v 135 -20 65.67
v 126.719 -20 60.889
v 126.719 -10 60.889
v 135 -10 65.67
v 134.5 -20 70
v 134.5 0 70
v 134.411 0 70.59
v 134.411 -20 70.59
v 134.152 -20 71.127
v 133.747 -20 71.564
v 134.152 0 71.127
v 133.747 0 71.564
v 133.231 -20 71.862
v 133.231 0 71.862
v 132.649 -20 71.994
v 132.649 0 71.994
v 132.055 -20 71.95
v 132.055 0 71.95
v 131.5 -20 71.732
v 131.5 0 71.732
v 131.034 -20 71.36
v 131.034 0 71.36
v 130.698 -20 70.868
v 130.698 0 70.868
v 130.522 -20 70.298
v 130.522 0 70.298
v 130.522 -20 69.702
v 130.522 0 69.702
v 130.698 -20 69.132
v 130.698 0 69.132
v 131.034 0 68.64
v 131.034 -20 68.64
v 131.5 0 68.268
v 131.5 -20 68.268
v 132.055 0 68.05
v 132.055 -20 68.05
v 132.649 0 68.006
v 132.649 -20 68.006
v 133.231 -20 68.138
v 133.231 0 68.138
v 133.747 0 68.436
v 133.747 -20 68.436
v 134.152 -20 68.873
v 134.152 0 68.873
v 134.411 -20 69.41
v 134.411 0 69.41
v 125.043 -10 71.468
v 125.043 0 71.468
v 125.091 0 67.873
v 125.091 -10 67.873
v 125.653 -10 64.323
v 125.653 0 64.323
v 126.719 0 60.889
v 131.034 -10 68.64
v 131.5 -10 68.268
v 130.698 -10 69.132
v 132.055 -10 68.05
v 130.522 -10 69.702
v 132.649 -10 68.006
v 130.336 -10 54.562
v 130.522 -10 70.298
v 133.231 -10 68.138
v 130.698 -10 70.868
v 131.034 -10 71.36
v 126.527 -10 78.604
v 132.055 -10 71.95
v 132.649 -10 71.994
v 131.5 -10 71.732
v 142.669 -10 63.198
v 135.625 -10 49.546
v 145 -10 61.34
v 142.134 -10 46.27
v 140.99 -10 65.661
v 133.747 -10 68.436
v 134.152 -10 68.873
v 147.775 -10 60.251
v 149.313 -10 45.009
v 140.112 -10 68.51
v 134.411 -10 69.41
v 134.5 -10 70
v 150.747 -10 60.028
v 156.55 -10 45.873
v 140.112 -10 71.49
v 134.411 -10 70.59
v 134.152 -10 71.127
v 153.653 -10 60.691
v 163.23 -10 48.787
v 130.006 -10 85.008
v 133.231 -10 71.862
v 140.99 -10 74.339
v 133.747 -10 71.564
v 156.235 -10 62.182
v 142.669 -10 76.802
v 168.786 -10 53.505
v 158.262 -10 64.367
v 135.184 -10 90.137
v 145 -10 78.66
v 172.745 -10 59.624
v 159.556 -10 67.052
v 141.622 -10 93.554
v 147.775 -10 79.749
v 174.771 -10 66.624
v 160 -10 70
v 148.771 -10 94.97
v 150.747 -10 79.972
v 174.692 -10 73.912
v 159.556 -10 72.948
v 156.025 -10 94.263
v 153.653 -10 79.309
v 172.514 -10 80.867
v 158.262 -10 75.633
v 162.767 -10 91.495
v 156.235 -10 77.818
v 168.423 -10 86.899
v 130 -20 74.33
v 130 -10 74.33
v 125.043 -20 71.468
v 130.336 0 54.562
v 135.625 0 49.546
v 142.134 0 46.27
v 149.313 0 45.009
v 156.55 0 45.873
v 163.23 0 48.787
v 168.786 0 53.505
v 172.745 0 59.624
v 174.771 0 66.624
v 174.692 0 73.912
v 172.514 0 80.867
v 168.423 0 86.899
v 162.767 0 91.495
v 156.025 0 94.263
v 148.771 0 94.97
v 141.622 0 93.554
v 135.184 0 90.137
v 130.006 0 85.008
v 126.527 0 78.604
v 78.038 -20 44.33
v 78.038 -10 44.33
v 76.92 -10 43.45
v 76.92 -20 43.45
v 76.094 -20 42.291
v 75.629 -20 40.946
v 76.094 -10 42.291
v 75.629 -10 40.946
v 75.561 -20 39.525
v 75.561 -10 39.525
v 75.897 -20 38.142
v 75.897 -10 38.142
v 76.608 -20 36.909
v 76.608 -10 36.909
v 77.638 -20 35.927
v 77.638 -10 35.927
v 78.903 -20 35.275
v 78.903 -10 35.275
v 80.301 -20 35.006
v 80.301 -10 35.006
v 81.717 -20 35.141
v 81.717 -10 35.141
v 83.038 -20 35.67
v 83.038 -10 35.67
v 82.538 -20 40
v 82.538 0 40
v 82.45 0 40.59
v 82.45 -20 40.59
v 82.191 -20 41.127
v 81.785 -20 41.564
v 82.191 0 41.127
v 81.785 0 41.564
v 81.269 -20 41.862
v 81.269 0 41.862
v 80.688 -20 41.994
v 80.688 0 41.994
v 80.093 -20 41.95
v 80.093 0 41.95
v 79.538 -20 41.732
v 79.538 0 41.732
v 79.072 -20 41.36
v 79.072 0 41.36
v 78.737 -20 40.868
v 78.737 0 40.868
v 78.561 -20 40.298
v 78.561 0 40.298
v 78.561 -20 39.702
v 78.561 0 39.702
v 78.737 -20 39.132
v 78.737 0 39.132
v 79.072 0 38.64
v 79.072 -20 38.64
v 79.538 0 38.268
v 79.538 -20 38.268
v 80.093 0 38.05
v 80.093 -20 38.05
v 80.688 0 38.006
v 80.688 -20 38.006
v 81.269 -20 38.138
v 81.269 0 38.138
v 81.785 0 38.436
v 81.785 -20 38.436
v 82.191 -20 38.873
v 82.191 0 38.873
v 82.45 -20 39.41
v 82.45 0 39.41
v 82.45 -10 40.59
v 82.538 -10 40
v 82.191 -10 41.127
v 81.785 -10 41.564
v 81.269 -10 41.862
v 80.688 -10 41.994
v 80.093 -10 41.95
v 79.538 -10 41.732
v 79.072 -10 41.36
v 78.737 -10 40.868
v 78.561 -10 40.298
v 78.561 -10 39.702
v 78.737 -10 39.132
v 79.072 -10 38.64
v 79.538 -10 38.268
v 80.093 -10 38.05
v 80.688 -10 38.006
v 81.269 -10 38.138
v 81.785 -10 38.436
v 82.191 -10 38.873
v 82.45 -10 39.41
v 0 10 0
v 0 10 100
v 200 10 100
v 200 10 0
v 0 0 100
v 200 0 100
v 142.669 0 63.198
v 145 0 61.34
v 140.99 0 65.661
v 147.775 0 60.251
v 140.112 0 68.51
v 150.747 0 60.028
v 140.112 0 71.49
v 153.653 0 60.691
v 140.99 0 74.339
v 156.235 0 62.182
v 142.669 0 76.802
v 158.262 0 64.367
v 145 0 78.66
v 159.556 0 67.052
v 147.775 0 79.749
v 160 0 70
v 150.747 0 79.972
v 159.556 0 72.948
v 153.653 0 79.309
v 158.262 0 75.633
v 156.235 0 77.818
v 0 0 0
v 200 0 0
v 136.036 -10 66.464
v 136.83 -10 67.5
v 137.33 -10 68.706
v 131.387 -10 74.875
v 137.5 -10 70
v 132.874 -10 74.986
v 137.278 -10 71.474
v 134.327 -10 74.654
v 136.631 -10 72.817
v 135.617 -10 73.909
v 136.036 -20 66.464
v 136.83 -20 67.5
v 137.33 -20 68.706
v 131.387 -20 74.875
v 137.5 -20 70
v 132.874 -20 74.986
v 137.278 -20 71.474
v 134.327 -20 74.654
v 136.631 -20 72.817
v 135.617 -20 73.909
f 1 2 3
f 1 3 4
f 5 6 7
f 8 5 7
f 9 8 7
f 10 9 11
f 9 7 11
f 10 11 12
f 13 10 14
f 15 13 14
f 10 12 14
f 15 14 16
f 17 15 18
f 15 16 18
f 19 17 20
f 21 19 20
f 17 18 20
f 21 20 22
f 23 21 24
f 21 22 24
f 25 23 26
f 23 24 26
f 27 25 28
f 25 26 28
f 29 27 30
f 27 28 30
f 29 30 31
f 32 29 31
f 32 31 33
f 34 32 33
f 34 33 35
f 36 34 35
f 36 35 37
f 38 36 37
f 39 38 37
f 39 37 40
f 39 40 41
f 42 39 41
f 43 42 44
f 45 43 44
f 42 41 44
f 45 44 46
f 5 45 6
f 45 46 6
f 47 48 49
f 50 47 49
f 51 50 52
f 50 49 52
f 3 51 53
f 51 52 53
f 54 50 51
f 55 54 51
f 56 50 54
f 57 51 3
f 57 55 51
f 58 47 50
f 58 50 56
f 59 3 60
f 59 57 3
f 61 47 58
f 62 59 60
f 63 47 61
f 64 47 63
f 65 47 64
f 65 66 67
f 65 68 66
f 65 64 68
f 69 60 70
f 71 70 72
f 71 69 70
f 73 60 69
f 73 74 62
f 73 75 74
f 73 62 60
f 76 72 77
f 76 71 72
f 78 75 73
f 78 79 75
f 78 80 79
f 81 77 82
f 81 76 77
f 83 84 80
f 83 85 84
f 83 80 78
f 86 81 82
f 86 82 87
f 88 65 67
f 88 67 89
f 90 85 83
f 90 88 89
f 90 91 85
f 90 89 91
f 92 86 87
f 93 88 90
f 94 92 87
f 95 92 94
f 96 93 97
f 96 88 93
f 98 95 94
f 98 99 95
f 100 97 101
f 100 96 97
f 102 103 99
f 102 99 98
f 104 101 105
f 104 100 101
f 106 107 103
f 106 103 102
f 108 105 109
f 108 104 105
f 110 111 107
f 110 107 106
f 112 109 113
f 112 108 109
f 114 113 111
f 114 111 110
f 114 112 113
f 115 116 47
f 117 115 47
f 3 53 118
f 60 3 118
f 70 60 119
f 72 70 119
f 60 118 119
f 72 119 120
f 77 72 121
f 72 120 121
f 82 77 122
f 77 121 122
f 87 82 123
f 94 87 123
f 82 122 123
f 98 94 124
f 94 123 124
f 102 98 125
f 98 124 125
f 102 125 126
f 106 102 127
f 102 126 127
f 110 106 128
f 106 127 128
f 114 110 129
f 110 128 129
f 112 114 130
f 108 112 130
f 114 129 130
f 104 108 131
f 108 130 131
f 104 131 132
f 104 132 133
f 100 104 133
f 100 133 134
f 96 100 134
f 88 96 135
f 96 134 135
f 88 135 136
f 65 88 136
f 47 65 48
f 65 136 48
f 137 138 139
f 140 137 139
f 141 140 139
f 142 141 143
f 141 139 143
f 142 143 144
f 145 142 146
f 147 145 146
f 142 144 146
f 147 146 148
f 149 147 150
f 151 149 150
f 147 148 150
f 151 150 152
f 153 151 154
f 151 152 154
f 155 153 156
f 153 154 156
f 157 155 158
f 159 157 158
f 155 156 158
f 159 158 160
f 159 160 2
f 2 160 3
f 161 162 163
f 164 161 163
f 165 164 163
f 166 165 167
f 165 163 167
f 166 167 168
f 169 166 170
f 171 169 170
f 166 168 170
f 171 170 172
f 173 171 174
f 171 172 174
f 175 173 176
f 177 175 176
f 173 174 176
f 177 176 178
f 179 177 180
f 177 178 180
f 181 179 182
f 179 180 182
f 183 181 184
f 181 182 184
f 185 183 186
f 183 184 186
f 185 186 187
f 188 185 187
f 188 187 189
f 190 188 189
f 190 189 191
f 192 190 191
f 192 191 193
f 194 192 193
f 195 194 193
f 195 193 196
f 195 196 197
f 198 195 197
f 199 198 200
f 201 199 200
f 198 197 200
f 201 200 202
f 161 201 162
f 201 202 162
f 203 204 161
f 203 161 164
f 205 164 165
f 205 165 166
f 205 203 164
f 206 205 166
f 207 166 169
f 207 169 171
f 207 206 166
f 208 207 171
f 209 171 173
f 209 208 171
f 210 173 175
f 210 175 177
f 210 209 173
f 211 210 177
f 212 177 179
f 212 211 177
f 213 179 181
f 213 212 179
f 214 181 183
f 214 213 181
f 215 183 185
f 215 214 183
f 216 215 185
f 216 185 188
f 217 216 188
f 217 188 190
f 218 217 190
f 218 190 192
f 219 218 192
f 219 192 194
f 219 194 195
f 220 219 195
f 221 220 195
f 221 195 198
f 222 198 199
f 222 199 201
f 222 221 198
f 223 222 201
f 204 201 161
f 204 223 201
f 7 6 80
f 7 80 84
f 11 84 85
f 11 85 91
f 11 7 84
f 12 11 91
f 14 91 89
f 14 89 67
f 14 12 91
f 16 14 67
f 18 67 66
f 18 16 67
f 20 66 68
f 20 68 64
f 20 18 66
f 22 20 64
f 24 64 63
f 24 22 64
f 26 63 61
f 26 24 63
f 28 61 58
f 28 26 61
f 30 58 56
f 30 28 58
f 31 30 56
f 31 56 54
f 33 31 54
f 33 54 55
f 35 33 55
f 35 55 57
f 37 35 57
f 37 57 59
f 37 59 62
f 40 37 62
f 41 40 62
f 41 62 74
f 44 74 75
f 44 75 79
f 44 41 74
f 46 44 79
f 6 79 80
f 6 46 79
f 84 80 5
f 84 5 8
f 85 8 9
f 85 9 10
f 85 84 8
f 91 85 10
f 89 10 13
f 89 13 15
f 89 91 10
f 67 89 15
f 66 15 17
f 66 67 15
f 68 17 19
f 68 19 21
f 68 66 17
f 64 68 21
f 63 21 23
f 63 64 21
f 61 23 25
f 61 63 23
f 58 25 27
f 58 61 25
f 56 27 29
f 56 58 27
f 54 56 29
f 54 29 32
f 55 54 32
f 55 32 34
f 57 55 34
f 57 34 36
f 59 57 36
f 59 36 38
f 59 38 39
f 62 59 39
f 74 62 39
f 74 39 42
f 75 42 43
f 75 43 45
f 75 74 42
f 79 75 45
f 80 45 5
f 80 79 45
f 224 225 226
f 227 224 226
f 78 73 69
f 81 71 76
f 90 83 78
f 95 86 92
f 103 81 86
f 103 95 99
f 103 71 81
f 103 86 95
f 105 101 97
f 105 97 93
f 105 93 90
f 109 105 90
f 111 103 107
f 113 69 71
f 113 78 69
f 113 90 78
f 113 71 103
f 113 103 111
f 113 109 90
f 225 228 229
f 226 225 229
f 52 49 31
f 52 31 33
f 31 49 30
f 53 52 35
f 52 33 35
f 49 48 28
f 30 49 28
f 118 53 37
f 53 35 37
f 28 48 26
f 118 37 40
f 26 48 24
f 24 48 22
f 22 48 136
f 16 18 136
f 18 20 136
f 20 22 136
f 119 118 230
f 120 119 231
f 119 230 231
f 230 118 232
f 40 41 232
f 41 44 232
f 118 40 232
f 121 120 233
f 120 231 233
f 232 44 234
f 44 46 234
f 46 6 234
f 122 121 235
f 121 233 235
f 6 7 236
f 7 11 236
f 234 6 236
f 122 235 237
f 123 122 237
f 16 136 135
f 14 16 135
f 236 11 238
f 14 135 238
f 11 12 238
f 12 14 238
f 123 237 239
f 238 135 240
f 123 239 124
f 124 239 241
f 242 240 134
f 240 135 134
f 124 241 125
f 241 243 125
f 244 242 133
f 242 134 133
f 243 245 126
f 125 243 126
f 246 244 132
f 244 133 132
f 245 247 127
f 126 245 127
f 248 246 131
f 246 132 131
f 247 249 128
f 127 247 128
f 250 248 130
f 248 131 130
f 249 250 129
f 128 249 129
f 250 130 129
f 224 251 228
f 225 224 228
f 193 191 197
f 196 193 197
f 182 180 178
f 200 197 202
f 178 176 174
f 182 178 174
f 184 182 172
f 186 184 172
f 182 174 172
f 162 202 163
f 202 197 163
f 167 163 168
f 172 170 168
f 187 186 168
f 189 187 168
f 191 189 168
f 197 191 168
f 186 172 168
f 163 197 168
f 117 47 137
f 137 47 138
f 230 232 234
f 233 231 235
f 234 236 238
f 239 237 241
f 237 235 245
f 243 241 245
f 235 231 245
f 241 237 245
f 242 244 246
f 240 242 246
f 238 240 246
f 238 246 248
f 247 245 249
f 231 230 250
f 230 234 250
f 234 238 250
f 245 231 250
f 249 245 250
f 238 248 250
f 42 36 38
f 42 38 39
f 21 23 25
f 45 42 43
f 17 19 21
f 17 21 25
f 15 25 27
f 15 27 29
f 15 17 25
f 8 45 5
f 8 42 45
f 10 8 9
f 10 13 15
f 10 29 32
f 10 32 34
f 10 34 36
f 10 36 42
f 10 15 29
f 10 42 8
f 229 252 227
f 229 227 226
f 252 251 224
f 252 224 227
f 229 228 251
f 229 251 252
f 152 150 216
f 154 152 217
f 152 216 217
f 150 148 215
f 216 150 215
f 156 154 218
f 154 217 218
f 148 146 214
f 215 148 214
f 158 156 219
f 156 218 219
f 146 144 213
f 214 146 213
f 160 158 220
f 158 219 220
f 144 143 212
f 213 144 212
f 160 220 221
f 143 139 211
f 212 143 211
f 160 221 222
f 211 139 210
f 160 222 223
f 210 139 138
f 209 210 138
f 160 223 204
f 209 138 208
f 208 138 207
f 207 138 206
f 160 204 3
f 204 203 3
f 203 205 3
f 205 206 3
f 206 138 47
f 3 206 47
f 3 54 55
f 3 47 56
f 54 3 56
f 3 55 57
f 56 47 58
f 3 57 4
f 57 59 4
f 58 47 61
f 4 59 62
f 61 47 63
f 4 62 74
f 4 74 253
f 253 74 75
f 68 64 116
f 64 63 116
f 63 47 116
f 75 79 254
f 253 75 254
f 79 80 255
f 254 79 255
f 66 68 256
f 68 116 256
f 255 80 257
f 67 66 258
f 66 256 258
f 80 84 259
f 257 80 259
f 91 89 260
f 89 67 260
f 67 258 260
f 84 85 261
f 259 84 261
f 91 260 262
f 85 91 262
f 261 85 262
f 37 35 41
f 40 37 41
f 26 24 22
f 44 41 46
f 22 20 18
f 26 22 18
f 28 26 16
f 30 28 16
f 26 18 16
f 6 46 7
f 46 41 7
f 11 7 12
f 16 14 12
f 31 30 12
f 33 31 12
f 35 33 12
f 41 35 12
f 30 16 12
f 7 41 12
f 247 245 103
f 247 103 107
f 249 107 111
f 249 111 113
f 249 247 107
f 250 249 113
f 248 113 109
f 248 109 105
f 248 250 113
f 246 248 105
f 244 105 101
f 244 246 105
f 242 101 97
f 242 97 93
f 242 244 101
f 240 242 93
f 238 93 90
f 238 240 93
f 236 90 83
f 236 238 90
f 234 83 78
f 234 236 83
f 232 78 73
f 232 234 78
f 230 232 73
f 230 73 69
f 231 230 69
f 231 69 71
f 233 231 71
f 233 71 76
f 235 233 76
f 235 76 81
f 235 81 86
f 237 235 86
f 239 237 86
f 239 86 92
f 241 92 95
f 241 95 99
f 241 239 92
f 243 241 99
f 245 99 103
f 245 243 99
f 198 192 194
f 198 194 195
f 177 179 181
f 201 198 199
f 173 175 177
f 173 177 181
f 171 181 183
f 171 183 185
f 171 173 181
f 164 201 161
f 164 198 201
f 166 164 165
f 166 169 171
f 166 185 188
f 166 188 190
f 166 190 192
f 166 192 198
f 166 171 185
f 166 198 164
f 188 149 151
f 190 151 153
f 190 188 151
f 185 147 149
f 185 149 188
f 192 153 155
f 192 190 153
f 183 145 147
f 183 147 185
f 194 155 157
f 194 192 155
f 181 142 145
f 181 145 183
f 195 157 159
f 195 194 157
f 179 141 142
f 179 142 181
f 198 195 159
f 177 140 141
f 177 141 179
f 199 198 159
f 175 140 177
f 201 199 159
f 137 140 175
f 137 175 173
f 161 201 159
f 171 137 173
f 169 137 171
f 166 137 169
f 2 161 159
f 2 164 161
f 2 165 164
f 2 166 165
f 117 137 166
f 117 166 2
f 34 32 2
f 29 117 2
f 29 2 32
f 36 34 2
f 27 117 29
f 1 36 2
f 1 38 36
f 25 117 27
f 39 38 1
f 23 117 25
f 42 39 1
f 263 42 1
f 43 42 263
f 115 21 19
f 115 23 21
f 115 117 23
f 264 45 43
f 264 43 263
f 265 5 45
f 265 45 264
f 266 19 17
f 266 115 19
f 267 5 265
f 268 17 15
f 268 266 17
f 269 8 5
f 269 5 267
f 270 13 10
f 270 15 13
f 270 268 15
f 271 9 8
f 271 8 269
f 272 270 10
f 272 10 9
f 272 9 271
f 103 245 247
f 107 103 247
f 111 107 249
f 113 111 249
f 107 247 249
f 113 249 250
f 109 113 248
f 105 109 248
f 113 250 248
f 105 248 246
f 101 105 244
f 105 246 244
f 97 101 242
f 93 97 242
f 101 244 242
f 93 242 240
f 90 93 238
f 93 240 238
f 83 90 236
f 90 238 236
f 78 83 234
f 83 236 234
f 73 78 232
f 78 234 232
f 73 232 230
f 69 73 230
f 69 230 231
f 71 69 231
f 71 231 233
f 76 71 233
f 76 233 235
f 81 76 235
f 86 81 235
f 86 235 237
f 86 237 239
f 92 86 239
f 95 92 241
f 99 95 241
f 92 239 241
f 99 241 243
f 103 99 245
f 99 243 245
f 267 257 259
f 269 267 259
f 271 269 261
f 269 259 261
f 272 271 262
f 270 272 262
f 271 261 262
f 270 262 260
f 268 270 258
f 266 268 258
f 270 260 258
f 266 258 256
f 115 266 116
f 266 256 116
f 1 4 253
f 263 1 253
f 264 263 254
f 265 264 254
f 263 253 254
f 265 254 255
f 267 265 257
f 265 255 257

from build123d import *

# Parameters (mm, degrees)
F0_W     = 200
F0_H     = 100
F0_R     = 10
F0_R_2   = 2
F1_DEPTH = 10
F2_DEPTH = 10
F3_START = 10
F3_DEPTH = 10
F4_DEPTH = 10
F5_DEPTH = 20
F6_DEPTH = 20


with BuildPart() as f1:
    # F0 (on Front) → F1 (new body)
    with BuildSketch(Plane.XZ):
        with Locations((100, 50)):
            Rectangle(F0_W, F0_H)
        with BuildLine():
            ThreePointArc((125.0431548231, 71.4682911217), (150.7344625853, 94.9892089653), (175, 70))
            ThreePointArc((175, 70), (154.6358929332, 45.4335900728), (126.7193202631, 60.8890203059))
            Line((126.7193202631, 60.8890203059), (83.0384757729, 35.6698729811))
            ThreePointArc((83.0384757729, 35.6698729811), (76.208348754, 37.5), (78.0384757729, 44.3301270189))
            Line((78.0384757729, 44.3301270189), (125.0431548231, 71.4682911217))
        make_face(mode=Mode.SUBTRACT)
        with BuildLine():
            ThreePointArc((126.7193202631, 60.8890203059), (154.6358929332, 45.4335900728), (175, 70))
            ThreePointArc((175, 70), (150.7344625853, 94.9892089653), (125.0431548231, 71.4682911217))
            Line((125.0431548231, 71.4682911217), (130, 74.3301270189))
            ThreePointArc((130, 74.3301270189), (135, 74.3301270189), (137.5, 70))
            ThreePointArc((137.5, 70), (136.8301270189, 67.5), (135, 65.6698729811))
            Line((135, 65.6698729811), (126.7193202631, 60.8890203059))
        make_face()
        with Locations((150, 70)):
            Circle(F0_R, mode=Mode.SUBTRACT)
        with BuildLine():
            ThreePointArc((126.7193202631, 60.8890203059), (125.3079983557, 66.0878324679), (125.0431548231, 71.4682911217))
            Line((125.0431548231, 71.4682911217), (78.0384757729, 44.3301270189))
            ThreePointArc((78.0384757729, 44.3301270189), (83.0384757729, 44.3301270189), (85.5384757729, 40))
            ThreePointArc((85.5384757729, 40), (84.8686027919, 37.5), (83.0384757729, 35.6698729811))
            Line((83.0384757729, 35.6698729811), (126.7193202631, 60.8890203059))
        make_face()
        with BuildLine():
            ThreePointArc((85.5384757729, 40), (83.0384757729, 44.3301270189), (78.0384757729, 44.3301270189))
            ThreePointArc((78.0384757729, 44.3301270189), (76.208348754, 37.5), (83.0384757729, 35.6698729811))
            ThreePointArc((83.0384757729, 35.6698729811), (84.8686027919, 37.5), (85.5384757729, 40))
        make_face()
        with Locations((80.5384757729, 40)):
            Circle(F0_R_2, mode=Mode.SUBTRACT)
        with BuildLine():
            Line((130, 74.3301270189), (125.0431548231, 71.4682911217))
            ThreePointArc((125.0431548231, 71.4682911217), (125.3079983557, 66.0878324679), (126.7193202631, 60.8890203059))
            Line((126.7193202631, 60.8890203059), (135, 65.6698729811))
            ThreePointArc((135, 65.6698729811), (128.1698729811, 67.5), (130, 74.3301270189))
        make_face()
        with Locations((150, 70)):
            Circle(F0_R)
        with Locations((80.5384757729, 40)):
            Circle(F0_R_2)
        with BuildLine():
            ThreePointArc((137.5, 70), (135, 74.3301270189), (130, 74.3301270189))
            ThreePointArc((130, 74.3301270189), (128.1698729811, 67.5), (135, 65.6698729811))
            ThreePointArc((135, 65.6698729811), (136.8301270189, 67.5), (137.5, 70))
        make_face()
        with Locations((132.5, 70)):
            Circle(F0_R_2, mode=Mode.SUBTRACT)
        with Locations((132.5, 70)):
            Circle(F0_R_2)
    extrude(amount=-F1_DEPTH)


with BuildPart() as f2:
    # F0 (on Front) → F2 (new body)
    with BuildSketch(Plane.XZ):
        with BuildLine():
            Line((130, 74.3301270189), (125.0431548231, 71.4682911217))
            ThreePointArc((125.0431548231, 71.4682911217), (125.3079983557, 66.0878324679), (126.7193202631, 60.8890203059))
            Line((126.7193202631, 60.8890203059), (135, 65.6698729811))
            ThreePointArc((135, 65.6698729811), (128.1698729811, 67.5), (130, 74.3301270189))
        make_face()
        with BuildLine():
            ThreePointArc((137.5, 70), (135, 74.3301270189), (130, 74.3301270189))
            ThreePointArc((130, 74.3301270189), (128.1698729811, 67.5), (135, 65.6698729811))
            ThreePointArc((135, 65.6698729811), (136.8301270189, 67.5), (137.5, 70))
        make_face()
        with Locations((132.5, 70)):
            Circle(F0_R_2, mode=Mode.SUBTRACT)
        with BuildLine():
            ThreePointArc((126.7193202631, 60.8890203059), (154.6358929332, 45.4335900728), (175, 70))
            ThreePointArc((175, 70), (150.7344625853, 94.9892089653), (125.0431548231, 71.4682911217))
            Line((125.0431548231, 71.4682911217), (130, 74.3301270189))
            ThreePointArc((130, 74.3301270189), (135, 74.3301270189), (137.5, 70))
            ThreePointArc((137.5, 70), (136.8301270189, 67.5), (135, 65.6698729811))
            Line((135, 65.6698729811), (126.7193202631, 60.8890203059))
        make_face()
        with Locations((150, 70)):
            Circle(F0_R, mode=Mode.SUBTRACT)
    extrude(amount=F2_DEPTH)


with BuildPart() as f3:
    # F0 (on Front) → F3 (new body)
    with BuildSketch(Plane.XZ.offset(F3_START)):
        with BuildLine():
            ThreePointArc((85.5384757729, 40), (83.0384757729, 44.3301270189), (78.0384757729, 44.3301270189))
            ThreePointArc((78.0384757729, 44.3301270189), (76.208348754, 37.5), (83.0384757729, 35.6698729811))
            ThreePointArc((83.0384757729, 35.6698729811), (84.8686027919, 37.5), (85.5384757729, 40))
        make_face()
        with Locations((80.5384757729, 40)):
            Circle(F0_R_2, mode=Mode.SUBTRACT)
        with BuildLine():
            ThreePointArc((126.7193202631, 60.8890203059), (125.3079983557, 66.0878324679), (125.0431548231, 71.4682911217))
            Line((125.0431548231, 71.4682911217), (78.0384757729, 44.3301270189))
            ThreePointArc((78.0384757729, 44.3301270189), (83.0384757729, 44.3301270189), (85.5384757729, 40))
            ThreePointArc((85.5384757729, 40), (84.8686027919, 37.5), (83.0384757729, 35.6698729811))
            Line((83.0384757729, 35.6698729811), (126.7193202631, 60.8890203059))
        make_face()
        with BuildLine():
            ThreePointArc((137.5, 70), (135, 74.3301270189), (130, 74.3301270189))
            ThreePointArc((130, 74.3301270189), (128.1698729811, 67.5), (135, 65.6698729811))
            ThreePointArc((135, 65.6698729811), (136.8301270189, 67.5), (137.5, 70))
        make_face()
        with Locations((132.5, 70)):
            Circle(F0_R_2, mode=Mode.SUBTRACT)
        with BuildLine():
            Line((130, 74.3301270189), (125.0431548231, 71.4682911217))
            ThreePointArc((125.0431548231, 71.4682911217), (125.3079983557, 66.0878324679), (126.7193202631, 60.8890203059))
            Line((126.7193202631, 60.8890203059), (135, 65.6698729811))
            ThreePointArc((135, 65.6698729811), (128.1698729811, 67.5), (130, 74.3301270189))
        make_face()
    extrude(amount=F3_DEPTH)


with BuildPart() as f4:
    # F0 (on Front) → F4 (new body)
    with BuildSketch(Plane.XZ):
        with Locations((150, 70)):
            Circle(F0_R)
    extrude(amount=F4_DEPTH)


with BuildPart() as f5:
    # F0 (on Front) → F5 (new body)
    with BuildSketch(Plane.XZ):
        with Locations((80.5384757729, 40)):
            Circle(F0_R_2)
    extrude(amount=F5_DEPTH)


with BuildPart() as f6:
    # F0 (on Front) → F6 (new body)
    with BuildSketch(Plane.XZ):
        with Locations((132.5, 70)):
            Circle(F0_R_2)
    extrude(amount=F6_DEPTH)


solid = Compound([f1.part, f2.part, f3.part, f4.part, f5.part, f6.part])
